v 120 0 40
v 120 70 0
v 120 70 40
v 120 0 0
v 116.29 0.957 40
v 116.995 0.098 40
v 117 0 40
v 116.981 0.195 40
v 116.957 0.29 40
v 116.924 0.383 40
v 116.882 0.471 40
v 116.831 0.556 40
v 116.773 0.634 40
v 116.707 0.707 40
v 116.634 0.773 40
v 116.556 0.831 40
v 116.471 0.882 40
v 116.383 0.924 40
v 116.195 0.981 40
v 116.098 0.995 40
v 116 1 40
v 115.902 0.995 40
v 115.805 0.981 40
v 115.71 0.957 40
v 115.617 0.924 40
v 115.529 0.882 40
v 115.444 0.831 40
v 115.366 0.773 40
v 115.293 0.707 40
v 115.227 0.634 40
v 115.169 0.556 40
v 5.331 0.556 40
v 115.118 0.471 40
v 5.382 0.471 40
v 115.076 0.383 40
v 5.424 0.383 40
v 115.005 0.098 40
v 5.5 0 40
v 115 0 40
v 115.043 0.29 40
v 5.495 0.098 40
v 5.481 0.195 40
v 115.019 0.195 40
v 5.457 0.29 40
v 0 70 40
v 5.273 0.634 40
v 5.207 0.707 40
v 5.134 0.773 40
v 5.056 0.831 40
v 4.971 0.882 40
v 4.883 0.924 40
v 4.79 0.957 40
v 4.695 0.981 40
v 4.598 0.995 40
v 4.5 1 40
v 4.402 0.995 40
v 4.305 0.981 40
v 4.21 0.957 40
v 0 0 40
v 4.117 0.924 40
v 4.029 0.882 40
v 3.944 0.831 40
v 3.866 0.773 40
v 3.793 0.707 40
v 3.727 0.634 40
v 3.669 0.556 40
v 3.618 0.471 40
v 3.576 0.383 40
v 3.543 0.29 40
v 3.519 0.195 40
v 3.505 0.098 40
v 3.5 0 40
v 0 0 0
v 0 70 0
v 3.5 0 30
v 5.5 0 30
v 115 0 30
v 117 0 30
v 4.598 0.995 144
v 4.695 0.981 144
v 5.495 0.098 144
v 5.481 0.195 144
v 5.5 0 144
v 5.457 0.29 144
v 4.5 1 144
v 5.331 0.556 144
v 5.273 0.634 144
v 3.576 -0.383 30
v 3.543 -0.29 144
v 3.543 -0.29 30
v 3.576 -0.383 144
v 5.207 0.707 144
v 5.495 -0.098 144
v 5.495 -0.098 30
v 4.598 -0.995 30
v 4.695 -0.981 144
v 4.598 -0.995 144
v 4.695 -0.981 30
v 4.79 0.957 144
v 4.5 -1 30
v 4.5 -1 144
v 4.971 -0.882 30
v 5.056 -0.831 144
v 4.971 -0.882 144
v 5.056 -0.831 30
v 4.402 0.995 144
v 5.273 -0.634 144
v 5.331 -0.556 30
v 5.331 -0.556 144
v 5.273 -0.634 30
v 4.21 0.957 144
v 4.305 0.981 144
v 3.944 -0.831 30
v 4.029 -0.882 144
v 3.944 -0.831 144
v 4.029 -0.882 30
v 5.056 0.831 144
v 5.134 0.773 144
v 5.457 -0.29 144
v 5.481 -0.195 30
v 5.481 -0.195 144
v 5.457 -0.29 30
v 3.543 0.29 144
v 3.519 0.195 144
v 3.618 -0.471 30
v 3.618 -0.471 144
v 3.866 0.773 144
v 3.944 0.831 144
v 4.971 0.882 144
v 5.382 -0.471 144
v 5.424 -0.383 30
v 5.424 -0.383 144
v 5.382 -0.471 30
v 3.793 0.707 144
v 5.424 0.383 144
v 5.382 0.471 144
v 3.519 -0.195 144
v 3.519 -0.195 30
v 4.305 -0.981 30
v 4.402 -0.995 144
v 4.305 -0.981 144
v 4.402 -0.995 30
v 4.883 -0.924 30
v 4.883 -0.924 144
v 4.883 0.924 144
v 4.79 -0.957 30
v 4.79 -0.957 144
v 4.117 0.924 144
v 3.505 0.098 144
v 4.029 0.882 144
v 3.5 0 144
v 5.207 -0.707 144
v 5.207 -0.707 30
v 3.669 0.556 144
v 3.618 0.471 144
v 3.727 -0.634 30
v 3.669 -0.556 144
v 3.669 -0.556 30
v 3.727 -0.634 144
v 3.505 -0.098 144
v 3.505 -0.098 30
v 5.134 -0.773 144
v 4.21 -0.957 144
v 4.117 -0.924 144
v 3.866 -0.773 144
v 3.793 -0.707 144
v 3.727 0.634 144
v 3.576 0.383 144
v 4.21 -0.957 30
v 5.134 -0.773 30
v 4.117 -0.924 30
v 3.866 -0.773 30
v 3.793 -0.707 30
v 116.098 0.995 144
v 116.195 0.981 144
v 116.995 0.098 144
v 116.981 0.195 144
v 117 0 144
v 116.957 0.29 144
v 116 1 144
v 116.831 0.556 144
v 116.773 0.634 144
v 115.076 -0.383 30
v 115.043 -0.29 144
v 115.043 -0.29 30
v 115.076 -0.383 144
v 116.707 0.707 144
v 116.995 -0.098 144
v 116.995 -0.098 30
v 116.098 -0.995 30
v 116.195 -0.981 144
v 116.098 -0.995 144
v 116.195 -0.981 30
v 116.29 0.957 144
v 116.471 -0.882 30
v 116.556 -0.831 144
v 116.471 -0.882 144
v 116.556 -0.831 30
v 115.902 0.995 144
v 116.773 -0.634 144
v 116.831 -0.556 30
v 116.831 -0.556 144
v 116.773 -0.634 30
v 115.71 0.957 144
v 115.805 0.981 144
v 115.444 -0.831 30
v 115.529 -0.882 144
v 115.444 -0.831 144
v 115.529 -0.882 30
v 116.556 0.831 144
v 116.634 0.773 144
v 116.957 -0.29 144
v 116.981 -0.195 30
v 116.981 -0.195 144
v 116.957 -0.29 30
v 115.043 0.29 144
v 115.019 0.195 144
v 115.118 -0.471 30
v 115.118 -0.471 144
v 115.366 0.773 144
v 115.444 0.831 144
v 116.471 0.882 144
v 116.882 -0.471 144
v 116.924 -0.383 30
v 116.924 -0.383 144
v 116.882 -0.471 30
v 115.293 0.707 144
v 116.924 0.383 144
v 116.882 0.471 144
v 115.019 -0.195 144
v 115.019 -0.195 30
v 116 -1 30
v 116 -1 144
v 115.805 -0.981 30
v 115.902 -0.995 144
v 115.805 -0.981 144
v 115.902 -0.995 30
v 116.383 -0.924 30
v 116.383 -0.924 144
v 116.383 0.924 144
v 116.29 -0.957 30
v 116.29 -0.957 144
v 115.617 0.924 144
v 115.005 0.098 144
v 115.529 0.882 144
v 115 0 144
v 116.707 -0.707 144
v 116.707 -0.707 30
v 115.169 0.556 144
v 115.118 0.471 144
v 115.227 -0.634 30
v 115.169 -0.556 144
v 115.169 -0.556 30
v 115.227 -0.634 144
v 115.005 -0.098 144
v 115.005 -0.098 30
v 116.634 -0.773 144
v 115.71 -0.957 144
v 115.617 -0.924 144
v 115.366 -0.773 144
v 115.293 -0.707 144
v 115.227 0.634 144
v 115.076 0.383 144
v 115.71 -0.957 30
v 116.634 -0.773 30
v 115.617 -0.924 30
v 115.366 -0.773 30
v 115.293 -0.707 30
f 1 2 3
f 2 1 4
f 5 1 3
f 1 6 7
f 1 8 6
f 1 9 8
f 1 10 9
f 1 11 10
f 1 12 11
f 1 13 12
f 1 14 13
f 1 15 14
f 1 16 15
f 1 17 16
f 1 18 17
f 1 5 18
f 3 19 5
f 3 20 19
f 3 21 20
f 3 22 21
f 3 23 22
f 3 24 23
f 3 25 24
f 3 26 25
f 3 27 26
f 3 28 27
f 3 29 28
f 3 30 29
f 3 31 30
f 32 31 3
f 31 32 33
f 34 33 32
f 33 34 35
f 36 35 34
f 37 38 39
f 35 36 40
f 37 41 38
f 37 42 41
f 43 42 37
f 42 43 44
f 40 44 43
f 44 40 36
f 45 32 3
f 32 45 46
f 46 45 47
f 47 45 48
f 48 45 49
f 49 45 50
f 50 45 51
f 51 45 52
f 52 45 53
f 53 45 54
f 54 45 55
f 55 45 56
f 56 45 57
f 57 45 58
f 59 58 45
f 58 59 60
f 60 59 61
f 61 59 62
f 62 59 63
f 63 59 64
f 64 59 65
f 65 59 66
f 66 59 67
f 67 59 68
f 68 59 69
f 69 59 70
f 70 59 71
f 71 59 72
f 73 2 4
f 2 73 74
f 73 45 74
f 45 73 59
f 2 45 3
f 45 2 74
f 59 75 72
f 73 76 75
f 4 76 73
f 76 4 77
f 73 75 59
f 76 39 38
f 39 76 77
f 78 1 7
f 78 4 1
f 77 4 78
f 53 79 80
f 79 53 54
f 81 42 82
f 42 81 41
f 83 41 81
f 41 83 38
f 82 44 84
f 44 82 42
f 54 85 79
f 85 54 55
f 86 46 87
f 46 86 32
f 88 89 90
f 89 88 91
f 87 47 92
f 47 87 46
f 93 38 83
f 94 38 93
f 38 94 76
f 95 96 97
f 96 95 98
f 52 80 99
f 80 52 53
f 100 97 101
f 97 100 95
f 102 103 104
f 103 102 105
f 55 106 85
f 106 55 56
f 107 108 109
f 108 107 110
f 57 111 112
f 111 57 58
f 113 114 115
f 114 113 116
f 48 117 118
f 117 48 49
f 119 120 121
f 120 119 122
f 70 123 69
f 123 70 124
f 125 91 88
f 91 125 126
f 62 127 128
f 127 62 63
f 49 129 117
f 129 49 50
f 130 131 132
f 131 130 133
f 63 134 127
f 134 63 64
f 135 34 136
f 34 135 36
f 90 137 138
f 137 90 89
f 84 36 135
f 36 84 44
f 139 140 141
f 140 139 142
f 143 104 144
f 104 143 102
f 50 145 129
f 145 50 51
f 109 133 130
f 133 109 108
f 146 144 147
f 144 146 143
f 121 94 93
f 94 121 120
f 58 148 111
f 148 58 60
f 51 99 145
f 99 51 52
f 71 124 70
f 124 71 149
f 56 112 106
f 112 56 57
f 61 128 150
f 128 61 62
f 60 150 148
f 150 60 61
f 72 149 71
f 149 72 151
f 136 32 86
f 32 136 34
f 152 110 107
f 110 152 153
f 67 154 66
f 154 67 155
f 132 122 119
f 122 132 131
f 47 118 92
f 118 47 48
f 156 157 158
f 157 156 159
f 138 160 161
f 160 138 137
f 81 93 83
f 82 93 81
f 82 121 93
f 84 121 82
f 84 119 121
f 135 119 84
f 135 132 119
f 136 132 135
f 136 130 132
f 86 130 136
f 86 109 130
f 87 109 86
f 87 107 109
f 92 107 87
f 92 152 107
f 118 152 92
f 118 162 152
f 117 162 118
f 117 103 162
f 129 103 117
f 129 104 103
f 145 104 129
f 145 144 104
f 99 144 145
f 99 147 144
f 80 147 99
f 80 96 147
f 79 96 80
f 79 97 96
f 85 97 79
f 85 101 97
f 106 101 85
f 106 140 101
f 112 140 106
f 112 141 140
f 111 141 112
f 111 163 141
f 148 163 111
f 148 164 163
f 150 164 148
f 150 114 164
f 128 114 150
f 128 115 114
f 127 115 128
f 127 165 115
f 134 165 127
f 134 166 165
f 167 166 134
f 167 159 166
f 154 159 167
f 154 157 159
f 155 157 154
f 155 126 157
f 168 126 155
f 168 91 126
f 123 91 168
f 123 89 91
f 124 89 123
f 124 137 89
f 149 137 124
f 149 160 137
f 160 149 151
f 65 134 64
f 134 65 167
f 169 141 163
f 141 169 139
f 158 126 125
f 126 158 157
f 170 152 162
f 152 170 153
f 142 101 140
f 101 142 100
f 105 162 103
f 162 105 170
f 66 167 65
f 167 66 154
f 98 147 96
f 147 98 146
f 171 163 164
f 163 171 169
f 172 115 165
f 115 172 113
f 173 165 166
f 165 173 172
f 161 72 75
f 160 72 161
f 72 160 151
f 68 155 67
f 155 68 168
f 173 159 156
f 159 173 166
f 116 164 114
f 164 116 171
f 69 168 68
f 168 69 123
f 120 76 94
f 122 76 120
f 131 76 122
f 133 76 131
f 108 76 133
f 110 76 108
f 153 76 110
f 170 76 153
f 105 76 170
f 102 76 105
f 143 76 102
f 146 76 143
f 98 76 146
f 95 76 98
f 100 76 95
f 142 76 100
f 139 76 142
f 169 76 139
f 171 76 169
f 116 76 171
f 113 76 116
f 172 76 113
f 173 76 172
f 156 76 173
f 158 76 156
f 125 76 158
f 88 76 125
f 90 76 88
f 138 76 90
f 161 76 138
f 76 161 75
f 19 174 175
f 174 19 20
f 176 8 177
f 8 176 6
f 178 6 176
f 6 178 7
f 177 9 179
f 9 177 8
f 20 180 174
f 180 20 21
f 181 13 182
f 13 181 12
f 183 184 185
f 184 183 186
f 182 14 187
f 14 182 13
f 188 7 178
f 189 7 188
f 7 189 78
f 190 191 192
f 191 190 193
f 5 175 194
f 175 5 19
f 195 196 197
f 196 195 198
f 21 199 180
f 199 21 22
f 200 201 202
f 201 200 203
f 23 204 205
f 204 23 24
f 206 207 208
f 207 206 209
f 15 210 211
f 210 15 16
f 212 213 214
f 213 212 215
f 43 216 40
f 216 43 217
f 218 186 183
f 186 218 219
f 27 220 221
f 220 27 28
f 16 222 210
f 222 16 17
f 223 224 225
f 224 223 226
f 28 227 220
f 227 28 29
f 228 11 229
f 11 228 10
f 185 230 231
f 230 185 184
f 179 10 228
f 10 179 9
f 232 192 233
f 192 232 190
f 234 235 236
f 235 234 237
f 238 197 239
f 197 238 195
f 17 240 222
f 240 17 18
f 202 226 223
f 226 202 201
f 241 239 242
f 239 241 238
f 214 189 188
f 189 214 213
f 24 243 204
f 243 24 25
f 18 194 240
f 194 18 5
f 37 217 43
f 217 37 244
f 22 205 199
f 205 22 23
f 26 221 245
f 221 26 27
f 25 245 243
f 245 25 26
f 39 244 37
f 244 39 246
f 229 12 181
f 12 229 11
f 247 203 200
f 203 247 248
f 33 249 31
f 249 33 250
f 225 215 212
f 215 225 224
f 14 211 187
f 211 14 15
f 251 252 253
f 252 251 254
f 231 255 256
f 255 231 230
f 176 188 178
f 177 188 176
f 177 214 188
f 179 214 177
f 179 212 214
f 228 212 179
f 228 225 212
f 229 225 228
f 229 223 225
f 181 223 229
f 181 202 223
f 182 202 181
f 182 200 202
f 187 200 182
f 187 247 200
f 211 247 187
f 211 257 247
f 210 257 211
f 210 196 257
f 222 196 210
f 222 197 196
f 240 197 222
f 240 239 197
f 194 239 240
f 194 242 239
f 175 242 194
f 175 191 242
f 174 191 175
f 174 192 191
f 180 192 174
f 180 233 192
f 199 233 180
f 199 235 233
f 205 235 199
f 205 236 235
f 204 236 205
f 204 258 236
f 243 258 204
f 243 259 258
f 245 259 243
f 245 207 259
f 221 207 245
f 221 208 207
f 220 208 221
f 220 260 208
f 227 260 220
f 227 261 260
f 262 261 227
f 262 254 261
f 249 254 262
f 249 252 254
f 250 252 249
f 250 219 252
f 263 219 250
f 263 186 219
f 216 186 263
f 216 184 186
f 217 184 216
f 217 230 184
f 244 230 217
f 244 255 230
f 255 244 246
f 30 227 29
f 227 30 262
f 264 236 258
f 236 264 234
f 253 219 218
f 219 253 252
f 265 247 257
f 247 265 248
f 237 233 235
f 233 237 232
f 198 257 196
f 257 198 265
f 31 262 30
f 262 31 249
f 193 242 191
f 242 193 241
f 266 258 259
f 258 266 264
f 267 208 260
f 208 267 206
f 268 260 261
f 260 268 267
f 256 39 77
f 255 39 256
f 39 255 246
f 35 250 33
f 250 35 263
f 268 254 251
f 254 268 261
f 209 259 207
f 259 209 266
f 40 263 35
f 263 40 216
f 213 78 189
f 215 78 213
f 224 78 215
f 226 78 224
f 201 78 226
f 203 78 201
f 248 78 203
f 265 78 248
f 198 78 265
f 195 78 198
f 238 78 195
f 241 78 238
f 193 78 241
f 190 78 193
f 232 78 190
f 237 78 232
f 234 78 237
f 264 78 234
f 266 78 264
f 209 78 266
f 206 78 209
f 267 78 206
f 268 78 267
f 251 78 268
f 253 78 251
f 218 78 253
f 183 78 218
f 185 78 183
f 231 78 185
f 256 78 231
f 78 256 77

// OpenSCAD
// Mini Horizontal Gel Electrophoresis Buffer Tank
// Outer dimensions: 120 x 70 x 40 mm
// Wall thickness: 3 mm
// Floor thickness: 3 mm
// Inner platform: 60 mm long, full width, 10 mm high above inner floor

$fn = 64;

// Outer Dimensions
X_OUT = 120;
Y_OUT = 70;
Z_OUT = 40;

// Thicknesses
wall_thick = 3;
floor_thick = 3;

// Inner Dimensions (calculated from outer and thicknesses)
X_IN = X_OUT - 2 * wall_thick;
Y_IN = Y_OUT - 2 * wall_thick;
Z_IN = Z_OUT - floor_thick; // Open top, so height is just Z_OUT - floor

// Platform Dimensions
plat_len = 60;
plat_width = Y_IN;
plat_height = 10; // Height above inner floor

// Electrode Hole Dimensions
hole_d = 2;
hole_y = 0;
hole_z = 30;

// Helper to create the main tank shell
module tank_shell() {
    // Calculate inner Z position of the floor (bottom of tank)
    z_floor = 0;
    
    // Calculate inner X and Y positions (centered)
    x_in_start = (X_OUT - X_IN) / 2;
    y_in_start = (Y_OUT - Y_IN) / 2;
    
    // Calculate platform Z position relative to bottom
    z_plat_bottom = floor_thick;
    z_plat_top = z_plat_bottom + plat_height;
    
    // Platform X position (centered)
    x_plat_start = (X_OUT - plat_len) / 2;
    
    // Build the solid tank with the platform inside
    union() {
        // 1. The main outer block (including floor)
        translate([0, 0, 0]) 
            cube([X_OUT, Y_OUT, Z_OUT]);
        
        // 2. Cut out the inner volume (walls and empty space)
        // We subtract the inner box, but we must be careful not to cut the platform
        // Strategy: Subtract the inner volume in two parts or use a complex difference.
        // Easier approach: Build the walls and floor as positive geometry, then subtract the empty space.
        
        // Let's rebuild using positive geometry for the tank body to ensure clean walls
        // Floor
        translate([x_in_start, y_in_start, 0]) 
            cube([X_IN, Y_IN, floor_thick]);
            
        // Side Walls (Left, Right, Front, Back)
        // Left Wall (at x_in_start)
        translate([x_in_start, y_in_start, floor_thick]) 
            cube([wall_thick, Y_IN, Z_IN]);
            
        // Right Wall (at x_out - wall_thick)
        translate([X_OUT - wall_thick, y_in_start, floor_thick]) 
            cube([wall_thick, Y_IN, Z_IN]);
            
        // Front Wall (at y_in_start)
        translate([x_in_start, y_in_start, floor_thick]) 
            cube([X_IN, wall_thick, Z_IN]);
            
        // Back Wall (at y_out - wall_thick)
        translate([x_in_start, Y_OUT - wall_thick, floor_thick]) 
            cube([X_IN, wall_thick, Z_IN]);
            
        // 3. The Raised Platform
        translate([x_plat_start, y_in_start, z_plat_bottom]) 
            cube([plat_len, plat_width, plat_height]);
    }
    
    // Now subtract the electrode holes
    // Hole 1: Left end wall
    translate([x_in_start + wall_thick/2, hole_y, hole_z]) 
        cylinder(h = X_IN, d = hole_d);
        
    // Hole 2: Right end wall
    translate([X_OUT - wall_thick - hole_d/2, hole_y, hole_z]) 
        cylinder(h = X_IN, d = hole_d);
}

// Generate the part
tank_shell();
